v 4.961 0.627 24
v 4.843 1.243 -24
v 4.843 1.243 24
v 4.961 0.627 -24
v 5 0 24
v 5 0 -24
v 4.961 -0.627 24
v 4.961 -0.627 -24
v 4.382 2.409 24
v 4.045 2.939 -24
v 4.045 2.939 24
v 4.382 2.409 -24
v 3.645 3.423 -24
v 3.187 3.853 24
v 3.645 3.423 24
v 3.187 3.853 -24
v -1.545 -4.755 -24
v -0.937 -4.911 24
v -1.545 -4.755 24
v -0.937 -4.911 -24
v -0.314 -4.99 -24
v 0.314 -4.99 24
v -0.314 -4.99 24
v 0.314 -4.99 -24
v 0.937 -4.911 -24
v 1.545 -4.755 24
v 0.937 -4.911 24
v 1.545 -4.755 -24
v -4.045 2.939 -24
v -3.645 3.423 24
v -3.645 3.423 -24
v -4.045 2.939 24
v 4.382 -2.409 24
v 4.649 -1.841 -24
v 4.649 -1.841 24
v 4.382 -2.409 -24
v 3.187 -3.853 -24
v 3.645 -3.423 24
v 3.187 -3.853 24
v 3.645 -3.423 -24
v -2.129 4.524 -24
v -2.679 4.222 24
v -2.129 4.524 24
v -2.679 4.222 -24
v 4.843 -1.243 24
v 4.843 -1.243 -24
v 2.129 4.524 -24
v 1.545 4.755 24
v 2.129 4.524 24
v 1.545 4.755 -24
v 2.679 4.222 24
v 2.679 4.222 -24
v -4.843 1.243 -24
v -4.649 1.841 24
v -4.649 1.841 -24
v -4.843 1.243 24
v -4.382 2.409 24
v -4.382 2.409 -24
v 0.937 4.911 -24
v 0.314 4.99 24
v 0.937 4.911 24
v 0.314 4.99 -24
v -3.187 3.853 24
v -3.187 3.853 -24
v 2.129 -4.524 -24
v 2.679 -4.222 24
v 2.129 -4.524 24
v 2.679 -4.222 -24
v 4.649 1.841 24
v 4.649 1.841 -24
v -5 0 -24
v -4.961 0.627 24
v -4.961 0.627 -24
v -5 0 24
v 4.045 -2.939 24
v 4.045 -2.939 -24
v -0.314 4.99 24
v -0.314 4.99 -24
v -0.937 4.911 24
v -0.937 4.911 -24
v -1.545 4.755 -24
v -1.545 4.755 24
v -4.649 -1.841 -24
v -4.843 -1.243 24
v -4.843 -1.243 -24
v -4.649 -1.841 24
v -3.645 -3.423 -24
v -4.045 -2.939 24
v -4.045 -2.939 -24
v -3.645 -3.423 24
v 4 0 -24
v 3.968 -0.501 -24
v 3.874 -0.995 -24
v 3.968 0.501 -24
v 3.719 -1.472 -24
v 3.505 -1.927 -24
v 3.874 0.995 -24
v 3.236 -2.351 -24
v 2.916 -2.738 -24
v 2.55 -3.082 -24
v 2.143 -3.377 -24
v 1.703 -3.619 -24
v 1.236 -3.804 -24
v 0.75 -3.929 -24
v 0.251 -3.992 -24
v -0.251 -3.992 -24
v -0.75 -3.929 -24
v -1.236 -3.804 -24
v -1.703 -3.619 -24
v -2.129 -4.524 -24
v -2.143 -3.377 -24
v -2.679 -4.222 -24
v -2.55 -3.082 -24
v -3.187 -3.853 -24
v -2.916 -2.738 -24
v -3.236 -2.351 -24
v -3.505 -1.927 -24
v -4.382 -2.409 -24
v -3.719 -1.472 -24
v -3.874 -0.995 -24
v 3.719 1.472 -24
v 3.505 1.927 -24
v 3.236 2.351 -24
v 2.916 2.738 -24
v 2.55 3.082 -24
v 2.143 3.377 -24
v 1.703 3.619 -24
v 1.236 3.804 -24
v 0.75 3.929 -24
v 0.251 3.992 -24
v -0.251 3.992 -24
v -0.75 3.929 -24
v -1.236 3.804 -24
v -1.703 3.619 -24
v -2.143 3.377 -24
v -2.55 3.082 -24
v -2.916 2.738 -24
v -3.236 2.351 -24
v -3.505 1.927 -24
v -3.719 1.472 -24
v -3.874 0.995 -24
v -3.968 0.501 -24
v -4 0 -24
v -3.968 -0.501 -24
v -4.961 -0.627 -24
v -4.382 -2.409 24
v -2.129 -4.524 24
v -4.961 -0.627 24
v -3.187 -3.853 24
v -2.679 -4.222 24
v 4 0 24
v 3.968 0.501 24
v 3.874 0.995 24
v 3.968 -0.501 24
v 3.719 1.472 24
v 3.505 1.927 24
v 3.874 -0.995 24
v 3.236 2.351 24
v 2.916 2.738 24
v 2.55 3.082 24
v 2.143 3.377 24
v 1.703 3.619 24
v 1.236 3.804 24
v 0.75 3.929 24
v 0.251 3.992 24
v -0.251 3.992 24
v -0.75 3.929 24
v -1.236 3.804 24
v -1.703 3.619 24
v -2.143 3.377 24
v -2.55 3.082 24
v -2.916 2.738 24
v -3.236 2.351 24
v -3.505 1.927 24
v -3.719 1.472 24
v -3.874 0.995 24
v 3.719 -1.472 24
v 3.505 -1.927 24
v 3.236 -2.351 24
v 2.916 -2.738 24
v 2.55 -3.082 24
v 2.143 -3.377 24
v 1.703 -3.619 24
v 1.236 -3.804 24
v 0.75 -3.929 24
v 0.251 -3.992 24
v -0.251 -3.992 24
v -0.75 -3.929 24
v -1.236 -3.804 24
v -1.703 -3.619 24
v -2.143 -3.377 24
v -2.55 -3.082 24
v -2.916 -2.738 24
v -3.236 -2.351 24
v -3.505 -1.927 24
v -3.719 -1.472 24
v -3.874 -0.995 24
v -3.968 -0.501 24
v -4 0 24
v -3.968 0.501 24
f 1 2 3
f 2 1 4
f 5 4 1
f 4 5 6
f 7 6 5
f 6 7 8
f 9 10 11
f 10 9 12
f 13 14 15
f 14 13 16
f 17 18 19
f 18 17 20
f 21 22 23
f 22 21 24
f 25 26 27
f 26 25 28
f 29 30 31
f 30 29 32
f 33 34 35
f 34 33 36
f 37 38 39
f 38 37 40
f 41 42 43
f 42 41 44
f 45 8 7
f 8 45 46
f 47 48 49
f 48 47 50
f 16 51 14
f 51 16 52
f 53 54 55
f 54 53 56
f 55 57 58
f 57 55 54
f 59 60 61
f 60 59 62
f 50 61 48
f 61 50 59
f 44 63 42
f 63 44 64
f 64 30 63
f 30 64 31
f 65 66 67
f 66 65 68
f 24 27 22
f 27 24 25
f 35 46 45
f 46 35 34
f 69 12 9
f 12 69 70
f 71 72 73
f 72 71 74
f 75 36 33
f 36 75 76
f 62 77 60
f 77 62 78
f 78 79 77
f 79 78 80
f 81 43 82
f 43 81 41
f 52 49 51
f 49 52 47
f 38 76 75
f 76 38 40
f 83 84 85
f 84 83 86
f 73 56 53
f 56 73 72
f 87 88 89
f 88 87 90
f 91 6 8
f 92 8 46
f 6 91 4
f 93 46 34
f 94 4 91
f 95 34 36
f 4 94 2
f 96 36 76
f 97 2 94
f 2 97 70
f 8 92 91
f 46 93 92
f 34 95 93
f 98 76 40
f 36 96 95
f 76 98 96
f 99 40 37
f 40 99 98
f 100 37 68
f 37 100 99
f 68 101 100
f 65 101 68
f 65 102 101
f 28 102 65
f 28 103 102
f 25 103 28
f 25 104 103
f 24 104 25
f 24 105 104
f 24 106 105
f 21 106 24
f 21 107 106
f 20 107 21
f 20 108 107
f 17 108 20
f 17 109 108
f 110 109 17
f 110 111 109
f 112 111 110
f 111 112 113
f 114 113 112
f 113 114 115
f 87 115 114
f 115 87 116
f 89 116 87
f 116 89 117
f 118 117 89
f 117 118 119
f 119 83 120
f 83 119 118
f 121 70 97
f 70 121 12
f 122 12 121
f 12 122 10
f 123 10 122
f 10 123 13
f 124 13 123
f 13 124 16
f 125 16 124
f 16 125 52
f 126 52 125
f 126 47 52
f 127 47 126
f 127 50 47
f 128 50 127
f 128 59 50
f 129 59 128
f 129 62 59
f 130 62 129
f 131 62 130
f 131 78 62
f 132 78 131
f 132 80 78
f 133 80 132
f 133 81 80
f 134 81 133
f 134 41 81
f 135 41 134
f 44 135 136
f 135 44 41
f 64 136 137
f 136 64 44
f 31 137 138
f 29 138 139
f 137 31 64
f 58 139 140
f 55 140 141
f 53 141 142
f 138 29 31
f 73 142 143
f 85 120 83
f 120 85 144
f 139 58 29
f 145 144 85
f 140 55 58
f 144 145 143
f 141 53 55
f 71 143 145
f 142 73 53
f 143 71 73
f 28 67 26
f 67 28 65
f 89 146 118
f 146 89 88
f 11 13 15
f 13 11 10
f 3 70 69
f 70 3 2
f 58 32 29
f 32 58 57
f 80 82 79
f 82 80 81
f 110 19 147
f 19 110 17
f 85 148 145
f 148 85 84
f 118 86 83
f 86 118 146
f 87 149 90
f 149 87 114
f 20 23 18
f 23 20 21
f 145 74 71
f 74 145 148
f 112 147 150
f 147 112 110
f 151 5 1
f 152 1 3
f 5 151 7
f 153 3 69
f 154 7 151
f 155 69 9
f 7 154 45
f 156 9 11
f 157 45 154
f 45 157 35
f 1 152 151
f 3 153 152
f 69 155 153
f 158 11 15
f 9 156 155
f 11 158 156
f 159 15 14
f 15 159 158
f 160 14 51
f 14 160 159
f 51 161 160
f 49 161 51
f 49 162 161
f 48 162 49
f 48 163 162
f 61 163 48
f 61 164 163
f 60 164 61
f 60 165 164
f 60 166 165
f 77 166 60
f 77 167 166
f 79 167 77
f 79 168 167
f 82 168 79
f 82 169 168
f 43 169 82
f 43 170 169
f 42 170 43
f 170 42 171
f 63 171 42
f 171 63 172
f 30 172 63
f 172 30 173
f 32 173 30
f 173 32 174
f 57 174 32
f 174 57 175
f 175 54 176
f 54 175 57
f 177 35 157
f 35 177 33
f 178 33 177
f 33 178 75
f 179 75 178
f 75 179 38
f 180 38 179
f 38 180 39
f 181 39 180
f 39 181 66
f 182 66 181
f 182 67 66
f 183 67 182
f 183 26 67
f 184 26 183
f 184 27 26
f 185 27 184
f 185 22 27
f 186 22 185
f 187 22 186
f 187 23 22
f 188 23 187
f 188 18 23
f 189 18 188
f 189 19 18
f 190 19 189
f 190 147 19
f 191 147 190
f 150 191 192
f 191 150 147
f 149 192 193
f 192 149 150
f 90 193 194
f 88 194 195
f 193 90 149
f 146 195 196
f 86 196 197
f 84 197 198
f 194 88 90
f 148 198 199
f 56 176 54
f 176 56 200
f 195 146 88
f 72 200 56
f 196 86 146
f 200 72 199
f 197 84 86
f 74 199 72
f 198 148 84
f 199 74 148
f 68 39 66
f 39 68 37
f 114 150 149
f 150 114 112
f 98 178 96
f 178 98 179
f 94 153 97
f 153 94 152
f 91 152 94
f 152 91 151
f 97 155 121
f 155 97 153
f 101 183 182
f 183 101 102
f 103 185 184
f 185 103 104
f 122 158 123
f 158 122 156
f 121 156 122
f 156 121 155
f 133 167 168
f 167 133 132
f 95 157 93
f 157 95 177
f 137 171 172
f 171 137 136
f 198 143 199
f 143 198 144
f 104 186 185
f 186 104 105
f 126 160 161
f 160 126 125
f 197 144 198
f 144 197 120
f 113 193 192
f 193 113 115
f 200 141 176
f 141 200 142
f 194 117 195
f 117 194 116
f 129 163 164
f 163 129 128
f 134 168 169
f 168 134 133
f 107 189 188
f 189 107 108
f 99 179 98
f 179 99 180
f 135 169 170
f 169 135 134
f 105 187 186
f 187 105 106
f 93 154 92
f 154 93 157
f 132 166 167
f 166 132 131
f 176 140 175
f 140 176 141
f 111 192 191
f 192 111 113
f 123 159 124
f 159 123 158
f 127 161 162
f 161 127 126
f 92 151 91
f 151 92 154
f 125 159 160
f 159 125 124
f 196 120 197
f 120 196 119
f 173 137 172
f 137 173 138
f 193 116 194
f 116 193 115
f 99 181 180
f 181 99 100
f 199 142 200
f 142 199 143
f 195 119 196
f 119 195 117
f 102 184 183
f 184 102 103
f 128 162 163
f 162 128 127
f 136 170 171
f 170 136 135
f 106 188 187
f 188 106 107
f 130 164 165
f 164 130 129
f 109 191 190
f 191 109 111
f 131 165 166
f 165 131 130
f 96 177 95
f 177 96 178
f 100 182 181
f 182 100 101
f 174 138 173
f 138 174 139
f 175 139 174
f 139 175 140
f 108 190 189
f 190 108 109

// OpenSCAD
$fn = 50;


difference() {
	union() {
		translate(v = [0, 0, -24.0000000000]) {
			cylinder(h = 48, r = 5.0000000000);
		}
	}
	union() {
		translate(v = [0, 0, -100.0000000000]) {
			cylinder(h = 200, r = 4.0000000000);
		}
	}
}
